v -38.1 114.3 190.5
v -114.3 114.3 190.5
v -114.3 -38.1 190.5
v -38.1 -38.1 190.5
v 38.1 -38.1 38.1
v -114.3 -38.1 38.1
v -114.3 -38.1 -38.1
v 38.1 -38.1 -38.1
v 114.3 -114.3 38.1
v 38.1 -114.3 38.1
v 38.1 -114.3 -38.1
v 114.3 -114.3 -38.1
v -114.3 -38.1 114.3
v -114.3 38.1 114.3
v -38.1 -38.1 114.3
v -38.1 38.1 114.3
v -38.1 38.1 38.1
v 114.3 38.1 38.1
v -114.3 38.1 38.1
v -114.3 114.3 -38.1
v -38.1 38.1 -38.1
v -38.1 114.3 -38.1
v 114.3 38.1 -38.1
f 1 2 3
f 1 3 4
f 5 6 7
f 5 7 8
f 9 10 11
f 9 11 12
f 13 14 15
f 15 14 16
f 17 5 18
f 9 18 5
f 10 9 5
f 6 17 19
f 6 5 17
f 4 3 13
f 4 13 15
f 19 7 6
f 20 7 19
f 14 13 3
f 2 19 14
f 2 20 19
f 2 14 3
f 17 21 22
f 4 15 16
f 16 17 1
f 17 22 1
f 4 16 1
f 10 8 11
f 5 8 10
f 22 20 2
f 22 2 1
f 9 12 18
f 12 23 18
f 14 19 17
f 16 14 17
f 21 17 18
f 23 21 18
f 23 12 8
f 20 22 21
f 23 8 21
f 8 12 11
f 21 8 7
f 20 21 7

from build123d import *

# Parameters (mm, degrees)
F1_W      = 228.6
F1_H      = 76.2
F2_DEPTH  = 38.1
F3_W      = 76.2
F3_H      = 76.2
F4_DEPTH  = 76.2
F5_W      = 76.2
F5_H      = 76.2
F6_DEPTH  = 76.2
F7_W      = 76.2
F7_H      = 76.2
F8_DEPTH  = 152.4
F9_W      = 76.2
F9_H      = 76.2
F10_DEPTH = 76.2


# Not quite as in the source:
# - a variable given as a bare number and used for a length is read in inches; the dataset says mm whatever the document's units were


with BuildPart() as f2:
    # F1 (on Front) → F2 (new body, symmetric)
    with BuildSketch(Plane.XZ):
        Rectangle(F1_W, F1_H)
    extrude(amount=F2_DEPTH, both=True)

    # F3 (on face) → F4 (join)
    with BuildSketch(Plane.XZ.offset(38.1)):
        with Locations((76.2, 0)):
            Rectangle(F3_W, F3_H)
    extrude(amount=F4_DEPTH)

    # F5 (on face) → F6 (join)
    with BuildSketch(Plane(origin=(0, 38.1, 0), x_dir=(-1, 0, 0), z_dir=(0, 1, 0))):
        with Locations((76.2, 0)):
            Rectangle(F5_W, F5_H)
    extrude(amount=F6_DEPTH)

    # F7 (on face) → F8 (join)
    with BuildSketch(Plane.XY.offset(38.1)):
        with Locations((-76.2, 76.2)):
            Rectangle(F7_W, F7_H)
    extrude(amount=F8_DEPTH)

    # F9 (on face) → F10 (join)
    with BuildSketch(Plane.XZ.offset(-38.1)):
        with Locations((-76.2, 152.4)):
            Rectangle(F9_W, F9_H)
    extrude(amount=F10_DEPTH)


solid = f2.part
